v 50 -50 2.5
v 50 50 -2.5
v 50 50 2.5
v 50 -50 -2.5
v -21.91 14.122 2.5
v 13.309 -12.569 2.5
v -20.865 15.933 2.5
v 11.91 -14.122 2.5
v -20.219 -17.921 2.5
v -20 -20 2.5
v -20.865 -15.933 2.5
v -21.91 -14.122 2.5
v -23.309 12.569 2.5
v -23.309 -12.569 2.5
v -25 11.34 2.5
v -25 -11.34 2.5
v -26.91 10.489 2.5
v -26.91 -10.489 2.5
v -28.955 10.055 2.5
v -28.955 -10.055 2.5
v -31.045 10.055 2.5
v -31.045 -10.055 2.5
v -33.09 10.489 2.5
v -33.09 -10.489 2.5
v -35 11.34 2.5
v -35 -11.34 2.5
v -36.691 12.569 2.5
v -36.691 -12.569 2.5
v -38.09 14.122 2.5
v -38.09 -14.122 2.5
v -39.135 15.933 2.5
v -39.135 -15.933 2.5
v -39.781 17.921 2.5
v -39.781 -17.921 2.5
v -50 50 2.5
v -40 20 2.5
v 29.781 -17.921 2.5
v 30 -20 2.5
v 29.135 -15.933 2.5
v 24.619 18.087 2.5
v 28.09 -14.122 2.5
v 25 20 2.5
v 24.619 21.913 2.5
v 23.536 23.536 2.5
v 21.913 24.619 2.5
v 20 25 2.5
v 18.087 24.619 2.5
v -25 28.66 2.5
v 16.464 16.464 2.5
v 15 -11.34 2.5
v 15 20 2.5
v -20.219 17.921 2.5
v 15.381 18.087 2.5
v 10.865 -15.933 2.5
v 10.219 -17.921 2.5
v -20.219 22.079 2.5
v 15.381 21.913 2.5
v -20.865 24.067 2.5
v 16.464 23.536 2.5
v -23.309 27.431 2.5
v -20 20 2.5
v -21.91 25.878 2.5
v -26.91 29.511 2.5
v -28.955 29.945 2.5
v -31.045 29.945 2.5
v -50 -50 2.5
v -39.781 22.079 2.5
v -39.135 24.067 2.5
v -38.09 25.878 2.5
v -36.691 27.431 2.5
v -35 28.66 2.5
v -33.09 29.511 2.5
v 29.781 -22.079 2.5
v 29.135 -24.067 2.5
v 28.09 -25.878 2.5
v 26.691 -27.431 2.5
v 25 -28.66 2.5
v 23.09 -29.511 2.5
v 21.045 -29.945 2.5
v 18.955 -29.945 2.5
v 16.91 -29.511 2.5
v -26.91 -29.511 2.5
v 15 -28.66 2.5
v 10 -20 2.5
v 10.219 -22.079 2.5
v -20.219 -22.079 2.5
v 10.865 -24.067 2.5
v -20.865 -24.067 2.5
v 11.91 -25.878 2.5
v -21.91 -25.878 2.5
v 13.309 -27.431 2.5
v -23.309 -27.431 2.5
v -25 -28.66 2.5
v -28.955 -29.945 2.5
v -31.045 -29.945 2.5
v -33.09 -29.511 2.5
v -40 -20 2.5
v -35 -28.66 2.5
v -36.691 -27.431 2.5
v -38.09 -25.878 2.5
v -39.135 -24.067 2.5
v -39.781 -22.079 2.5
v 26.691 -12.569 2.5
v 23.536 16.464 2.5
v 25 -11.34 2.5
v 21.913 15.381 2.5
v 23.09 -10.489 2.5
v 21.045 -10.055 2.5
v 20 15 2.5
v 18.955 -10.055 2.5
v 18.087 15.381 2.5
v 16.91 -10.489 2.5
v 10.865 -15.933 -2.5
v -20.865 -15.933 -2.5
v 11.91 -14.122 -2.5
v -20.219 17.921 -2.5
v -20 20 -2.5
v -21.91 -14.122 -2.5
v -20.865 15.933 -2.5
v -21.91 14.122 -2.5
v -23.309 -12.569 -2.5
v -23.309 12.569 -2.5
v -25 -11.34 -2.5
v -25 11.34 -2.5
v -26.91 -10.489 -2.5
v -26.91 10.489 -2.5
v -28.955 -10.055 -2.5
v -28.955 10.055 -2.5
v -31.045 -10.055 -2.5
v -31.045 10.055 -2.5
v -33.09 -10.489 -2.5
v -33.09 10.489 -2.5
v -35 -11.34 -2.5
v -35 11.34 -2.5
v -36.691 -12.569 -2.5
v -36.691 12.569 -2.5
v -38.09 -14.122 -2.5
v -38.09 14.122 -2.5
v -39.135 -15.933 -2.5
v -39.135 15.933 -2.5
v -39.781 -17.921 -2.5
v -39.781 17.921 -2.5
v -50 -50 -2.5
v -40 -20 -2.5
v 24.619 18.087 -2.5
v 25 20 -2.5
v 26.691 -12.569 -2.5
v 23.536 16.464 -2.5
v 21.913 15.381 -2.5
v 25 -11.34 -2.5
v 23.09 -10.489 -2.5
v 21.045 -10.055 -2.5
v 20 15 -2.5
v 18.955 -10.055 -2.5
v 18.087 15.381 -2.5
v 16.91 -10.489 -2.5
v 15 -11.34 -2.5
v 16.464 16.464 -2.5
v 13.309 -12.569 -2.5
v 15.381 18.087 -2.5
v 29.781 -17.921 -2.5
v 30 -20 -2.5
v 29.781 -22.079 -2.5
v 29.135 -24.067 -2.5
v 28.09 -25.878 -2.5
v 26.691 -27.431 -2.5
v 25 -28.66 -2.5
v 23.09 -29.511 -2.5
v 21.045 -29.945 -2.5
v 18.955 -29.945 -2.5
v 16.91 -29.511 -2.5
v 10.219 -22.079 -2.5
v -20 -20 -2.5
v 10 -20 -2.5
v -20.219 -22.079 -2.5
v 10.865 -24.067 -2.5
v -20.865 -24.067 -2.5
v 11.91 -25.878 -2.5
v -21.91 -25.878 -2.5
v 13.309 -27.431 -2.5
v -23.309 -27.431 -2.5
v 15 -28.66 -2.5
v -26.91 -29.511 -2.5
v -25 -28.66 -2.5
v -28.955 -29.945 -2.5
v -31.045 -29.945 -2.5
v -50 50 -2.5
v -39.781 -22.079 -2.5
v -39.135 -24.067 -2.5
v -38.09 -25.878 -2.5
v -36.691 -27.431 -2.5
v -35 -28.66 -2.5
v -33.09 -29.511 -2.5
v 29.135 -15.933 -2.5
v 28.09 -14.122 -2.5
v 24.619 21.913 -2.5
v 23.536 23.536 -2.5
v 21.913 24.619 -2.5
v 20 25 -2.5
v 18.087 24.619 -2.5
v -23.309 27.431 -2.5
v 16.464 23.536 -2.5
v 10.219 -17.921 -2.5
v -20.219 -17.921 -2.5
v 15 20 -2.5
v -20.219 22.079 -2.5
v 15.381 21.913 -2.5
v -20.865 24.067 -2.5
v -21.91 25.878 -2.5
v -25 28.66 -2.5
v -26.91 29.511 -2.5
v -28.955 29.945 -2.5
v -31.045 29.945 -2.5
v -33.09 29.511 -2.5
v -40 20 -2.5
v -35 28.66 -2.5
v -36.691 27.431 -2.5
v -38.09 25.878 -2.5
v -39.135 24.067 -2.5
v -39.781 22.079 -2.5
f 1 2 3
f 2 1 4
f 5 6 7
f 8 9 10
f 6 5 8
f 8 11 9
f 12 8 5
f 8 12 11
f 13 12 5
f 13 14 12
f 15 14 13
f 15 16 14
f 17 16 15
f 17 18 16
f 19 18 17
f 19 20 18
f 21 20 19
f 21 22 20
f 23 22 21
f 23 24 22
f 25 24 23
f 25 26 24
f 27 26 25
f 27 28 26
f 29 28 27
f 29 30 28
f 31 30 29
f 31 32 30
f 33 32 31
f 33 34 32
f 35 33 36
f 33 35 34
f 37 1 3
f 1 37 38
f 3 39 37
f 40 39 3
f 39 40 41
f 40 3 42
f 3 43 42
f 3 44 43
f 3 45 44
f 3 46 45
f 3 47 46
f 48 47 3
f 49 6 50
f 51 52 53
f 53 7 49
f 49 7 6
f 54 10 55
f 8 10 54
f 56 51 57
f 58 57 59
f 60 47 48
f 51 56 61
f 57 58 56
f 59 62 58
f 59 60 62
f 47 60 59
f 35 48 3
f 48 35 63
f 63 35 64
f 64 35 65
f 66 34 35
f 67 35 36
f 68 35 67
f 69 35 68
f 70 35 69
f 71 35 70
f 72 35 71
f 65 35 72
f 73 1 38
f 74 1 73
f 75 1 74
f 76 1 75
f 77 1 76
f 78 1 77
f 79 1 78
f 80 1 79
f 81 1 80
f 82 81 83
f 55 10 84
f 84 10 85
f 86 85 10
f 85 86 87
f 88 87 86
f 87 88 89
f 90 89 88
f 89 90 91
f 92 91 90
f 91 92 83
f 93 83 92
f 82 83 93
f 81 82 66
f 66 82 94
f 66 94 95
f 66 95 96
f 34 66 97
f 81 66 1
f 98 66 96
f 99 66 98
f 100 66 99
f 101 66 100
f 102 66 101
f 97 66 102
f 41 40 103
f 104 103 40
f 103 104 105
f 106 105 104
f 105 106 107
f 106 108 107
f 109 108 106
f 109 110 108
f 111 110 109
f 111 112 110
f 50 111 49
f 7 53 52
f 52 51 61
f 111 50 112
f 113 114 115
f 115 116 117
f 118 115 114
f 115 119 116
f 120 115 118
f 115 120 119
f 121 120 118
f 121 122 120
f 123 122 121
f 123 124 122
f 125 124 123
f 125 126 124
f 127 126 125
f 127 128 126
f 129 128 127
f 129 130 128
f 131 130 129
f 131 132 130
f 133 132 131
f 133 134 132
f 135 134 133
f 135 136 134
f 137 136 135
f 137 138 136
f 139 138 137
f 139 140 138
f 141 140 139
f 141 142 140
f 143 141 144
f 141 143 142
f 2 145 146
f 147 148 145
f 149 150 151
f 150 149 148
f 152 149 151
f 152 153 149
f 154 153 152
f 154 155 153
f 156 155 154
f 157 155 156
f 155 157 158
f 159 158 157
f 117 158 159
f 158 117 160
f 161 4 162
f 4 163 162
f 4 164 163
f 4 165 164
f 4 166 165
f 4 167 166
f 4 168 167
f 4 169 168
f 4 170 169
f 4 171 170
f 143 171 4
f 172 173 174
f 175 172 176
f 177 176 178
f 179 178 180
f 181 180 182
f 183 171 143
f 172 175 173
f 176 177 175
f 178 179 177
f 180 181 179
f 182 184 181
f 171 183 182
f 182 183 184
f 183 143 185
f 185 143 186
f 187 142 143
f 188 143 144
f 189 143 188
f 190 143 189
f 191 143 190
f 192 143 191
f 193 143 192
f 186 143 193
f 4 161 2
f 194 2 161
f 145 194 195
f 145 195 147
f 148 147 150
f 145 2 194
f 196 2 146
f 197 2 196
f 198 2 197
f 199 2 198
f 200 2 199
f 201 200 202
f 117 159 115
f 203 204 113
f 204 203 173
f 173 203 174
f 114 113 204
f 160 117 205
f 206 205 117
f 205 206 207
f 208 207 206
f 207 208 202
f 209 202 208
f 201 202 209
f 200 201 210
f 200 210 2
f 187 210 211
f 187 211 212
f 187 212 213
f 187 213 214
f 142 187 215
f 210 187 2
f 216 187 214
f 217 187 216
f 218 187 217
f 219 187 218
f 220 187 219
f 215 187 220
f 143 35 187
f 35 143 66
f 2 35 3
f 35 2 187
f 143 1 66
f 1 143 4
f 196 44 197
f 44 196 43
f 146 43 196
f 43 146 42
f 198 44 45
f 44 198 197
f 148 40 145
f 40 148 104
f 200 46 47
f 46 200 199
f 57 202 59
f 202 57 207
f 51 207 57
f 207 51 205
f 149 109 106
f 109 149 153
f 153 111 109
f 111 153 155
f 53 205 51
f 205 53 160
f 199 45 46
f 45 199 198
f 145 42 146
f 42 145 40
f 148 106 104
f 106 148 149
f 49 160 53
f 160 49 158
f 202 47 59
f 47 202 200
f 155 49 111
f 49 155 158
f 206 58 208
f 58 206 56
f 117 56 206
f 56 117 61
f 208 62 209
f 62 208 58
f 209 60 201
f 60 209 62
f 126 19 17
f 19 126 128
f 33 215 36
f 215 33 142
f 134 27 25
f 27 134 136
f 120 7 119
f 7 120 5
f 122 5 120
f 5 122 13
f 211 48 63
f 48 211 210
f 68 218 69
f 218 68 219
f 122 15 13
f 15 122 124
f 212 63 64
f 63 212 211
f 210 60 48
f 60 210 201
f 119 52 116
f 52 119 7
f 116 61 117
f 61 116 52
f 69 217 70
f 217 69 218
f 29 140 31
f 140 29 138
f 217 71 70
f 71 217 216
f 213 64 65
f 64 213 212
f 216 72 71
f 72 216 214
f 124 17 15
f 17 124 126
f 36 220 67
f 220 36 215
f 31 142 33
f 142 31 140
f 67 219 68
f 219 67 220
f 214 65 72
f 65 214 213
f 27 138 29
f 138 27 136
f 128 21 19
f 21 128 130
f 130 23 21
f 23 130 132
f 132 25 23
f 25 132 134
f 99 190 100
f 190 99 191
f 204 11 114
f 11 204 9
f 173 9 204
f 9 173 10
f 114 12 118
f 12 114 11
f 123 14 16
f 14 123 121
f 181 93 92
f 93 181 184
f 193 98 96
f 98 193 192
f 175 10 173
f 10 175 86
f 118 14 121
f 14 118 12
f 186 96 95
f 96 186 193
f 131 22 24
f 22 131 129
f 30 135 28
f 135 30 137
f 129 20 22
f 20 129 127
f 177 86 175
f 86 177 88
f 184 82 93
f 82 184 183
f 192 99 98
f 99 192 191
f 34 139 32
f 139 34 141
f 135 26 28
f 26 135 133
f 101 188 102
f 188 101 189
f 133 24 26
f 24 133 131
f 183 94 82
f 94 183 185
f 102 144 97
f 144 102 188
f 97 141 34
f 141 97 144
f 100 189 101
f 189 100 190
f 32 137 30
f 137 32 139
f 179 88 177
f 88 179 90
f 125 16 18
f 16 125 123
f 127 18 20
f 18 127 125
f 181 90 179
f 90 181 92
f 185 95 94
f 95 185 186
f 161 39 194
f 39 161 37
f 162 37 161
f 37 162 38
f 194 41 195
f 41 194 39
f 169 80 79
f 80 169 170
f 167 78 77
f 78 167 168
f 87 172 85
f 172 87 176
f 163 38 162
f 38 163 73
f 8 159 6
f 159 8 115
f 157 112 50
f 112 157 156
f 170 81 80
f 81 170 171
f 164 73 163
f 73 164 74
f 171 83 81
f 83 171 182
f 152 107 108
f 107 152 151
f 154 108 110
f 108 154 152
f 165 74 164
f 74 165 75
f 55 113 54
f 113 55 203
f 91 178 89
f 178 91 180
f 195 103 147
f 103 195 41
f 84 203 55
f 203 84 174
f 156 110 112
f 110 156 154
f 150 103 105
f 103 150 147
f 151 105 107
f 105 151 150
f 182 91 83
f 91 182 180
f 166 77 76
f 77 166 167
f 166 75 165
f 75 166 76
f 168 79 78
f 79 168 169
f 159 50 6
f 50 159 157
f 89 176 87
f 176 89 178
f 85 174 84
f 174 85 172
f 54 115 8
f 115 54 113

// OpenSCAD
// Plate
Plate_Thickness = 5;
Plate_Width = 100;
Plate_Height = 100;

interasse = 50;
interasse_2 = 80;
first_hole = [20,20,-2];
Hole_Diameter = 5;
Plate_Thickness = 5;

translate([first_hole[0] - interasse,-20,-2]){
%cube([40,1,1]);
}

difference(){

color("#a8b0b2"){
cube([100,100,Plate_Thickness], center = true);
}


translate(first_hole){
cylinder(12,Hole_Diameter,Hole_Diameter, center = true);
}

translate([first_hole[0] - interasse,20,-2]){
cylinder(12,10,10, center = true);
}

translate([first_hole[0] - interasse,-20,-2]){
cylinder(12,10,10, center = true);
}

translate([20,-20,-2]){
cylinder(12,10,10, center = true);
}


}
